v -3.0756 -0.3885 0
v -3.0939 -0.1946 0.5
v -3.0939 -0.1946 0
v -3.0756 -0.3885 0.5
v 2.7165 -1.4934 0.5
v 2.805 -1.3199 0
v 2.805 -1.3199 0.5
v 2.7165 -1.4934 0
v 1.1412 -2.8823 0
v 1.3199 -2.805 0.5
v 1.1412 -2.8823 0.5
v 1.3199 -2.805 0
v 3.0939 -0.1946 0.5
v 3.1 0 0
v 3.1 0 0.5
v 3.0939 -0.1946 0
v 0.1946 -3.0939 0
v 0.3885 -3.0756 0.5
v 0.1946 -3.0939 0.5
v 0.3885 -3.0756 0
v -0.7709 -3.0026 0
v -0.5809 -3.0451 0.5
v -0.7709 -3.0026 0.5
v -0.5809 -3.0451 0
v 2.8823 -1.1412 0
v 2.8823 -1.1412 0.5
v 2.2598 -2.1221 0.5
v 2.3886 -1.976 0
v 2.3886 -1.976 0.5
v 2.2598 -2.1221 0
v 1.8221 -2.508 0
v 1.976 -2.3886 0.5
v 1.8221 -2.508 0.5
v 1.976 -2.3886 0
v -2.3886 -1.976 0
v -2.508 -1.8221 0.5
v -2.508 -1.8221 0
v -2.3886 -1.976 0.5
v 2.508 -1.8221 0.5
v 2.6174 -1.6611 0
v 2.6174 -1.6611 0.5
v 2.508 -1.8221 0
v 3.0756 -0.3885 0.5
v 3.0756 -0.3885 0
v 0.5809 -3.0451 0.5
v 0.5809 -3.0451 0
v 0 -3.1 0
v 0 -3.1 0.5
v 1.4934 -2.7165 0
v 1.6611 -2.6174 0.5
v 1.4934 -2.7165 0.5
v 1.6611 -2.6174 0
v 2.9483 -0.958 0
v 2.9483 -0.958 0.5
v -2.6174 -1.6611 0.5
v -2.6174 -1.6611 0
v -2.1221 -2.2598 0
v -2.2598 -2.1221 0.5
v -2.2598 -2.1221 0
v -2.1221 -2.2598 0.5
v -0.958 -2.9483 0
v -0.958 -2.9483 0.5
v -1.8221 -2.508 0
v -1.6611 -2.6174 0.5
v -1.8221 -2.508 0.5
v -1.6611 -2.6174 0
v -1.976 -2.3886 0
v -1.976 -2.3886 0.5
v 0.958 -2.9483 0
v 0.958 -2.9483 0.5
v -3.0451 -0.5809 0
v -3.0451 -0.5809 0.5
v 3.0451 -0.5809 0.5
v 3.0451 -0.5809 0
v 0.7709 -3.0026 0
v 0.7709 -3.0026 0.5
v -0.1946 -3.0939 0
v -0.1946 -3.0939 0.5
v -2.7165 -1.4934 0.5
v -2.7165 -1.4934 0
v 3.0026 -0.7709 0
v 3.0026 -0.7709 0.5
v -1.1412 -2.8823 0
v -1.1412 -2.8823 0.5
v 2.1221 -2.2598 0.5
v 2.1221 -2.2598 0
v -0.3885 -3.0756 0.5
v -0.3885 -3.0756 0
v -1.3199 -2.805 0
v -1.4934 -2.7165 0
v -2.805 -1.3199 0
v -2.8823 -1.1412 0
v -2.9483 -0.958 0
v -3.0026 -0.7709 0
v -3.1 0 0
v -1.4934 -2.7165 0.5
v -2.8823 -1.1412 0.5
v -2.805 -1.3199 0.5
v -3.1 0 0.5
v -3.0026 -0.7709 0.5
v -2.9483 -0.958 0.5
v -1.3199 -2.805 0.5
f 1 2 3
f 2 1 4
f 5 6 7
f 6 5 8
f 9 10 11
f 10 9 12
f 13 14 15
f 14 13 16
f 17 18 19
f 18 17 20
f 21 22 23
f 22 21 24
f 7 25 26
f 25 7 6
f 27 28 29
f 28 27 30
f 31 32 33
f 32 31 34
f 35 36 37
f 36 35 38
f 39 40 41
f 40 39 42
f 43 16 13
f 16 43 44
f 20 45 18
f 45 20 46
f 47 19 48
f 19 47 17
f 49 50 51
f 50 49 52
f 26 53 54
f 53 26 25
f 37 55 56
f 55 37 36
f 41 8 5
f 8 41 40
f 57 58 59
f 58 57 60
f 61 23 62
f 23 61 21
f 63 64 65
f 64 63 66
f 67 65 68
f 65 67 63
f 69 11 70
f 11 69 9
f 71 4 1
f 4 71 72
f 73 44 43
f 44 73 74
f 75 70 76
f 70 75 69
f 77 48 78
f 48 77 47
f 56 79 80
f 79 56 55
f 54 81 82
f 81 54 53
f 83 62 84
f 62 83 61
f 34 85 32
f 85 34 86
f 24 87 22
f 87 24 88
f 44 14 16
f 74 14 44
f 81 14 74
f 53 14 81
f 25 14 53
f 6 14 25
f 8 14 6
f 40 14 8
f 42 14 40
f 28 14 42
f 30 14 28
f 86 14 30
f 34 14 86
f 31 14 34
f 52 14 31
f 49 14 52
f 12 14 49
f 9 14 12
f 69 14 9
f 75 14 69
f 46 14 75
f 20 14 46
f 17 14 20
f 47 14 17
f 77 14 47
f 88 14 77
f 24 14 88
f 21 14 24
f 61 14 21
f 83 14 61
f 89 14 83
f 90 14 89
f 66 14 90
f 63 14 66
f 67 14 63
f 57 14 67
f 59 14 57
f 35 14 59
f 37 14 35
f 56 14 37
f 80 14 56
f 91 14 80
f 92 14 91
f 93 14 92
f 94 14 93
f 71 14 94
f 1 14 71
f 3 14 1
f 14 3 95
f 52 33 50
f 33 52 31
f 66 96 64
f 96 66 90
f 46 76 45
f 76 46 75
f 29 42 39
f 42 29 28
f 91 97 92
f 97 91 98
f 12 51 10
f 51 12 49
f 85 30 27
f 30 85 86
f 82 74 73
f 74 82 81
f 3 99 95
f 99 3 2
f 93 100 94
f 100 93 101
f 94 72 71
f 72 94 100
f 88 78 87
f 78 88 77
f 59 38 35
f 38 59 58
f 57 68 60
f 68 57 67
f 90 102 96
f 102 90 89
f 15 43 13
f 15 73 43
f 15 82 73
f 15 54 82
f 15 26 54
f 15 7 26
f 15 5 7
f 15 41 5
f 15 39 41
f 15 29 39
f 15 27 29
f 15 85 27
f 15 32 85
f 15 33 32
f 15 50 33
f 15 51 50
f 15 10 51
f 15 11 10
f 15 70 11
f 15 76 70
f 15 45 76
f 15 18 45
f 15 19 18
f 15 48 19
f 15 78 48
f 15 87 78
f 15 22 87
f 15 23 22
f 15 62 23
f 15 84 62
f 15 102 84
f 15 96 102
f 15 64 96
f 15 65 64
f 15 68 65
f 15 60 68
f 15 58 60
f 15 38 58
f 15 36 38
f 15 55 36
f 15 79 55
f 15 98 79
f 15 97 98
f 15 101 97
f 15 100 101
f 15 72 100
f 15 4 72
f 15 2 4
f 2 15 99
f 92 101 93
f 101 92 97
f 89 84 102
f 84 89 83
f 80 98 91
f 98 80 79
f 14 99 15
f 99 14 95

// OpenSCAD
difference(){
cylinder(0.5,3.1, 3.1, $fn = 100);
translate([-3.15,0, -0.1]){cube(6.3, 6.3, .7);}
}
